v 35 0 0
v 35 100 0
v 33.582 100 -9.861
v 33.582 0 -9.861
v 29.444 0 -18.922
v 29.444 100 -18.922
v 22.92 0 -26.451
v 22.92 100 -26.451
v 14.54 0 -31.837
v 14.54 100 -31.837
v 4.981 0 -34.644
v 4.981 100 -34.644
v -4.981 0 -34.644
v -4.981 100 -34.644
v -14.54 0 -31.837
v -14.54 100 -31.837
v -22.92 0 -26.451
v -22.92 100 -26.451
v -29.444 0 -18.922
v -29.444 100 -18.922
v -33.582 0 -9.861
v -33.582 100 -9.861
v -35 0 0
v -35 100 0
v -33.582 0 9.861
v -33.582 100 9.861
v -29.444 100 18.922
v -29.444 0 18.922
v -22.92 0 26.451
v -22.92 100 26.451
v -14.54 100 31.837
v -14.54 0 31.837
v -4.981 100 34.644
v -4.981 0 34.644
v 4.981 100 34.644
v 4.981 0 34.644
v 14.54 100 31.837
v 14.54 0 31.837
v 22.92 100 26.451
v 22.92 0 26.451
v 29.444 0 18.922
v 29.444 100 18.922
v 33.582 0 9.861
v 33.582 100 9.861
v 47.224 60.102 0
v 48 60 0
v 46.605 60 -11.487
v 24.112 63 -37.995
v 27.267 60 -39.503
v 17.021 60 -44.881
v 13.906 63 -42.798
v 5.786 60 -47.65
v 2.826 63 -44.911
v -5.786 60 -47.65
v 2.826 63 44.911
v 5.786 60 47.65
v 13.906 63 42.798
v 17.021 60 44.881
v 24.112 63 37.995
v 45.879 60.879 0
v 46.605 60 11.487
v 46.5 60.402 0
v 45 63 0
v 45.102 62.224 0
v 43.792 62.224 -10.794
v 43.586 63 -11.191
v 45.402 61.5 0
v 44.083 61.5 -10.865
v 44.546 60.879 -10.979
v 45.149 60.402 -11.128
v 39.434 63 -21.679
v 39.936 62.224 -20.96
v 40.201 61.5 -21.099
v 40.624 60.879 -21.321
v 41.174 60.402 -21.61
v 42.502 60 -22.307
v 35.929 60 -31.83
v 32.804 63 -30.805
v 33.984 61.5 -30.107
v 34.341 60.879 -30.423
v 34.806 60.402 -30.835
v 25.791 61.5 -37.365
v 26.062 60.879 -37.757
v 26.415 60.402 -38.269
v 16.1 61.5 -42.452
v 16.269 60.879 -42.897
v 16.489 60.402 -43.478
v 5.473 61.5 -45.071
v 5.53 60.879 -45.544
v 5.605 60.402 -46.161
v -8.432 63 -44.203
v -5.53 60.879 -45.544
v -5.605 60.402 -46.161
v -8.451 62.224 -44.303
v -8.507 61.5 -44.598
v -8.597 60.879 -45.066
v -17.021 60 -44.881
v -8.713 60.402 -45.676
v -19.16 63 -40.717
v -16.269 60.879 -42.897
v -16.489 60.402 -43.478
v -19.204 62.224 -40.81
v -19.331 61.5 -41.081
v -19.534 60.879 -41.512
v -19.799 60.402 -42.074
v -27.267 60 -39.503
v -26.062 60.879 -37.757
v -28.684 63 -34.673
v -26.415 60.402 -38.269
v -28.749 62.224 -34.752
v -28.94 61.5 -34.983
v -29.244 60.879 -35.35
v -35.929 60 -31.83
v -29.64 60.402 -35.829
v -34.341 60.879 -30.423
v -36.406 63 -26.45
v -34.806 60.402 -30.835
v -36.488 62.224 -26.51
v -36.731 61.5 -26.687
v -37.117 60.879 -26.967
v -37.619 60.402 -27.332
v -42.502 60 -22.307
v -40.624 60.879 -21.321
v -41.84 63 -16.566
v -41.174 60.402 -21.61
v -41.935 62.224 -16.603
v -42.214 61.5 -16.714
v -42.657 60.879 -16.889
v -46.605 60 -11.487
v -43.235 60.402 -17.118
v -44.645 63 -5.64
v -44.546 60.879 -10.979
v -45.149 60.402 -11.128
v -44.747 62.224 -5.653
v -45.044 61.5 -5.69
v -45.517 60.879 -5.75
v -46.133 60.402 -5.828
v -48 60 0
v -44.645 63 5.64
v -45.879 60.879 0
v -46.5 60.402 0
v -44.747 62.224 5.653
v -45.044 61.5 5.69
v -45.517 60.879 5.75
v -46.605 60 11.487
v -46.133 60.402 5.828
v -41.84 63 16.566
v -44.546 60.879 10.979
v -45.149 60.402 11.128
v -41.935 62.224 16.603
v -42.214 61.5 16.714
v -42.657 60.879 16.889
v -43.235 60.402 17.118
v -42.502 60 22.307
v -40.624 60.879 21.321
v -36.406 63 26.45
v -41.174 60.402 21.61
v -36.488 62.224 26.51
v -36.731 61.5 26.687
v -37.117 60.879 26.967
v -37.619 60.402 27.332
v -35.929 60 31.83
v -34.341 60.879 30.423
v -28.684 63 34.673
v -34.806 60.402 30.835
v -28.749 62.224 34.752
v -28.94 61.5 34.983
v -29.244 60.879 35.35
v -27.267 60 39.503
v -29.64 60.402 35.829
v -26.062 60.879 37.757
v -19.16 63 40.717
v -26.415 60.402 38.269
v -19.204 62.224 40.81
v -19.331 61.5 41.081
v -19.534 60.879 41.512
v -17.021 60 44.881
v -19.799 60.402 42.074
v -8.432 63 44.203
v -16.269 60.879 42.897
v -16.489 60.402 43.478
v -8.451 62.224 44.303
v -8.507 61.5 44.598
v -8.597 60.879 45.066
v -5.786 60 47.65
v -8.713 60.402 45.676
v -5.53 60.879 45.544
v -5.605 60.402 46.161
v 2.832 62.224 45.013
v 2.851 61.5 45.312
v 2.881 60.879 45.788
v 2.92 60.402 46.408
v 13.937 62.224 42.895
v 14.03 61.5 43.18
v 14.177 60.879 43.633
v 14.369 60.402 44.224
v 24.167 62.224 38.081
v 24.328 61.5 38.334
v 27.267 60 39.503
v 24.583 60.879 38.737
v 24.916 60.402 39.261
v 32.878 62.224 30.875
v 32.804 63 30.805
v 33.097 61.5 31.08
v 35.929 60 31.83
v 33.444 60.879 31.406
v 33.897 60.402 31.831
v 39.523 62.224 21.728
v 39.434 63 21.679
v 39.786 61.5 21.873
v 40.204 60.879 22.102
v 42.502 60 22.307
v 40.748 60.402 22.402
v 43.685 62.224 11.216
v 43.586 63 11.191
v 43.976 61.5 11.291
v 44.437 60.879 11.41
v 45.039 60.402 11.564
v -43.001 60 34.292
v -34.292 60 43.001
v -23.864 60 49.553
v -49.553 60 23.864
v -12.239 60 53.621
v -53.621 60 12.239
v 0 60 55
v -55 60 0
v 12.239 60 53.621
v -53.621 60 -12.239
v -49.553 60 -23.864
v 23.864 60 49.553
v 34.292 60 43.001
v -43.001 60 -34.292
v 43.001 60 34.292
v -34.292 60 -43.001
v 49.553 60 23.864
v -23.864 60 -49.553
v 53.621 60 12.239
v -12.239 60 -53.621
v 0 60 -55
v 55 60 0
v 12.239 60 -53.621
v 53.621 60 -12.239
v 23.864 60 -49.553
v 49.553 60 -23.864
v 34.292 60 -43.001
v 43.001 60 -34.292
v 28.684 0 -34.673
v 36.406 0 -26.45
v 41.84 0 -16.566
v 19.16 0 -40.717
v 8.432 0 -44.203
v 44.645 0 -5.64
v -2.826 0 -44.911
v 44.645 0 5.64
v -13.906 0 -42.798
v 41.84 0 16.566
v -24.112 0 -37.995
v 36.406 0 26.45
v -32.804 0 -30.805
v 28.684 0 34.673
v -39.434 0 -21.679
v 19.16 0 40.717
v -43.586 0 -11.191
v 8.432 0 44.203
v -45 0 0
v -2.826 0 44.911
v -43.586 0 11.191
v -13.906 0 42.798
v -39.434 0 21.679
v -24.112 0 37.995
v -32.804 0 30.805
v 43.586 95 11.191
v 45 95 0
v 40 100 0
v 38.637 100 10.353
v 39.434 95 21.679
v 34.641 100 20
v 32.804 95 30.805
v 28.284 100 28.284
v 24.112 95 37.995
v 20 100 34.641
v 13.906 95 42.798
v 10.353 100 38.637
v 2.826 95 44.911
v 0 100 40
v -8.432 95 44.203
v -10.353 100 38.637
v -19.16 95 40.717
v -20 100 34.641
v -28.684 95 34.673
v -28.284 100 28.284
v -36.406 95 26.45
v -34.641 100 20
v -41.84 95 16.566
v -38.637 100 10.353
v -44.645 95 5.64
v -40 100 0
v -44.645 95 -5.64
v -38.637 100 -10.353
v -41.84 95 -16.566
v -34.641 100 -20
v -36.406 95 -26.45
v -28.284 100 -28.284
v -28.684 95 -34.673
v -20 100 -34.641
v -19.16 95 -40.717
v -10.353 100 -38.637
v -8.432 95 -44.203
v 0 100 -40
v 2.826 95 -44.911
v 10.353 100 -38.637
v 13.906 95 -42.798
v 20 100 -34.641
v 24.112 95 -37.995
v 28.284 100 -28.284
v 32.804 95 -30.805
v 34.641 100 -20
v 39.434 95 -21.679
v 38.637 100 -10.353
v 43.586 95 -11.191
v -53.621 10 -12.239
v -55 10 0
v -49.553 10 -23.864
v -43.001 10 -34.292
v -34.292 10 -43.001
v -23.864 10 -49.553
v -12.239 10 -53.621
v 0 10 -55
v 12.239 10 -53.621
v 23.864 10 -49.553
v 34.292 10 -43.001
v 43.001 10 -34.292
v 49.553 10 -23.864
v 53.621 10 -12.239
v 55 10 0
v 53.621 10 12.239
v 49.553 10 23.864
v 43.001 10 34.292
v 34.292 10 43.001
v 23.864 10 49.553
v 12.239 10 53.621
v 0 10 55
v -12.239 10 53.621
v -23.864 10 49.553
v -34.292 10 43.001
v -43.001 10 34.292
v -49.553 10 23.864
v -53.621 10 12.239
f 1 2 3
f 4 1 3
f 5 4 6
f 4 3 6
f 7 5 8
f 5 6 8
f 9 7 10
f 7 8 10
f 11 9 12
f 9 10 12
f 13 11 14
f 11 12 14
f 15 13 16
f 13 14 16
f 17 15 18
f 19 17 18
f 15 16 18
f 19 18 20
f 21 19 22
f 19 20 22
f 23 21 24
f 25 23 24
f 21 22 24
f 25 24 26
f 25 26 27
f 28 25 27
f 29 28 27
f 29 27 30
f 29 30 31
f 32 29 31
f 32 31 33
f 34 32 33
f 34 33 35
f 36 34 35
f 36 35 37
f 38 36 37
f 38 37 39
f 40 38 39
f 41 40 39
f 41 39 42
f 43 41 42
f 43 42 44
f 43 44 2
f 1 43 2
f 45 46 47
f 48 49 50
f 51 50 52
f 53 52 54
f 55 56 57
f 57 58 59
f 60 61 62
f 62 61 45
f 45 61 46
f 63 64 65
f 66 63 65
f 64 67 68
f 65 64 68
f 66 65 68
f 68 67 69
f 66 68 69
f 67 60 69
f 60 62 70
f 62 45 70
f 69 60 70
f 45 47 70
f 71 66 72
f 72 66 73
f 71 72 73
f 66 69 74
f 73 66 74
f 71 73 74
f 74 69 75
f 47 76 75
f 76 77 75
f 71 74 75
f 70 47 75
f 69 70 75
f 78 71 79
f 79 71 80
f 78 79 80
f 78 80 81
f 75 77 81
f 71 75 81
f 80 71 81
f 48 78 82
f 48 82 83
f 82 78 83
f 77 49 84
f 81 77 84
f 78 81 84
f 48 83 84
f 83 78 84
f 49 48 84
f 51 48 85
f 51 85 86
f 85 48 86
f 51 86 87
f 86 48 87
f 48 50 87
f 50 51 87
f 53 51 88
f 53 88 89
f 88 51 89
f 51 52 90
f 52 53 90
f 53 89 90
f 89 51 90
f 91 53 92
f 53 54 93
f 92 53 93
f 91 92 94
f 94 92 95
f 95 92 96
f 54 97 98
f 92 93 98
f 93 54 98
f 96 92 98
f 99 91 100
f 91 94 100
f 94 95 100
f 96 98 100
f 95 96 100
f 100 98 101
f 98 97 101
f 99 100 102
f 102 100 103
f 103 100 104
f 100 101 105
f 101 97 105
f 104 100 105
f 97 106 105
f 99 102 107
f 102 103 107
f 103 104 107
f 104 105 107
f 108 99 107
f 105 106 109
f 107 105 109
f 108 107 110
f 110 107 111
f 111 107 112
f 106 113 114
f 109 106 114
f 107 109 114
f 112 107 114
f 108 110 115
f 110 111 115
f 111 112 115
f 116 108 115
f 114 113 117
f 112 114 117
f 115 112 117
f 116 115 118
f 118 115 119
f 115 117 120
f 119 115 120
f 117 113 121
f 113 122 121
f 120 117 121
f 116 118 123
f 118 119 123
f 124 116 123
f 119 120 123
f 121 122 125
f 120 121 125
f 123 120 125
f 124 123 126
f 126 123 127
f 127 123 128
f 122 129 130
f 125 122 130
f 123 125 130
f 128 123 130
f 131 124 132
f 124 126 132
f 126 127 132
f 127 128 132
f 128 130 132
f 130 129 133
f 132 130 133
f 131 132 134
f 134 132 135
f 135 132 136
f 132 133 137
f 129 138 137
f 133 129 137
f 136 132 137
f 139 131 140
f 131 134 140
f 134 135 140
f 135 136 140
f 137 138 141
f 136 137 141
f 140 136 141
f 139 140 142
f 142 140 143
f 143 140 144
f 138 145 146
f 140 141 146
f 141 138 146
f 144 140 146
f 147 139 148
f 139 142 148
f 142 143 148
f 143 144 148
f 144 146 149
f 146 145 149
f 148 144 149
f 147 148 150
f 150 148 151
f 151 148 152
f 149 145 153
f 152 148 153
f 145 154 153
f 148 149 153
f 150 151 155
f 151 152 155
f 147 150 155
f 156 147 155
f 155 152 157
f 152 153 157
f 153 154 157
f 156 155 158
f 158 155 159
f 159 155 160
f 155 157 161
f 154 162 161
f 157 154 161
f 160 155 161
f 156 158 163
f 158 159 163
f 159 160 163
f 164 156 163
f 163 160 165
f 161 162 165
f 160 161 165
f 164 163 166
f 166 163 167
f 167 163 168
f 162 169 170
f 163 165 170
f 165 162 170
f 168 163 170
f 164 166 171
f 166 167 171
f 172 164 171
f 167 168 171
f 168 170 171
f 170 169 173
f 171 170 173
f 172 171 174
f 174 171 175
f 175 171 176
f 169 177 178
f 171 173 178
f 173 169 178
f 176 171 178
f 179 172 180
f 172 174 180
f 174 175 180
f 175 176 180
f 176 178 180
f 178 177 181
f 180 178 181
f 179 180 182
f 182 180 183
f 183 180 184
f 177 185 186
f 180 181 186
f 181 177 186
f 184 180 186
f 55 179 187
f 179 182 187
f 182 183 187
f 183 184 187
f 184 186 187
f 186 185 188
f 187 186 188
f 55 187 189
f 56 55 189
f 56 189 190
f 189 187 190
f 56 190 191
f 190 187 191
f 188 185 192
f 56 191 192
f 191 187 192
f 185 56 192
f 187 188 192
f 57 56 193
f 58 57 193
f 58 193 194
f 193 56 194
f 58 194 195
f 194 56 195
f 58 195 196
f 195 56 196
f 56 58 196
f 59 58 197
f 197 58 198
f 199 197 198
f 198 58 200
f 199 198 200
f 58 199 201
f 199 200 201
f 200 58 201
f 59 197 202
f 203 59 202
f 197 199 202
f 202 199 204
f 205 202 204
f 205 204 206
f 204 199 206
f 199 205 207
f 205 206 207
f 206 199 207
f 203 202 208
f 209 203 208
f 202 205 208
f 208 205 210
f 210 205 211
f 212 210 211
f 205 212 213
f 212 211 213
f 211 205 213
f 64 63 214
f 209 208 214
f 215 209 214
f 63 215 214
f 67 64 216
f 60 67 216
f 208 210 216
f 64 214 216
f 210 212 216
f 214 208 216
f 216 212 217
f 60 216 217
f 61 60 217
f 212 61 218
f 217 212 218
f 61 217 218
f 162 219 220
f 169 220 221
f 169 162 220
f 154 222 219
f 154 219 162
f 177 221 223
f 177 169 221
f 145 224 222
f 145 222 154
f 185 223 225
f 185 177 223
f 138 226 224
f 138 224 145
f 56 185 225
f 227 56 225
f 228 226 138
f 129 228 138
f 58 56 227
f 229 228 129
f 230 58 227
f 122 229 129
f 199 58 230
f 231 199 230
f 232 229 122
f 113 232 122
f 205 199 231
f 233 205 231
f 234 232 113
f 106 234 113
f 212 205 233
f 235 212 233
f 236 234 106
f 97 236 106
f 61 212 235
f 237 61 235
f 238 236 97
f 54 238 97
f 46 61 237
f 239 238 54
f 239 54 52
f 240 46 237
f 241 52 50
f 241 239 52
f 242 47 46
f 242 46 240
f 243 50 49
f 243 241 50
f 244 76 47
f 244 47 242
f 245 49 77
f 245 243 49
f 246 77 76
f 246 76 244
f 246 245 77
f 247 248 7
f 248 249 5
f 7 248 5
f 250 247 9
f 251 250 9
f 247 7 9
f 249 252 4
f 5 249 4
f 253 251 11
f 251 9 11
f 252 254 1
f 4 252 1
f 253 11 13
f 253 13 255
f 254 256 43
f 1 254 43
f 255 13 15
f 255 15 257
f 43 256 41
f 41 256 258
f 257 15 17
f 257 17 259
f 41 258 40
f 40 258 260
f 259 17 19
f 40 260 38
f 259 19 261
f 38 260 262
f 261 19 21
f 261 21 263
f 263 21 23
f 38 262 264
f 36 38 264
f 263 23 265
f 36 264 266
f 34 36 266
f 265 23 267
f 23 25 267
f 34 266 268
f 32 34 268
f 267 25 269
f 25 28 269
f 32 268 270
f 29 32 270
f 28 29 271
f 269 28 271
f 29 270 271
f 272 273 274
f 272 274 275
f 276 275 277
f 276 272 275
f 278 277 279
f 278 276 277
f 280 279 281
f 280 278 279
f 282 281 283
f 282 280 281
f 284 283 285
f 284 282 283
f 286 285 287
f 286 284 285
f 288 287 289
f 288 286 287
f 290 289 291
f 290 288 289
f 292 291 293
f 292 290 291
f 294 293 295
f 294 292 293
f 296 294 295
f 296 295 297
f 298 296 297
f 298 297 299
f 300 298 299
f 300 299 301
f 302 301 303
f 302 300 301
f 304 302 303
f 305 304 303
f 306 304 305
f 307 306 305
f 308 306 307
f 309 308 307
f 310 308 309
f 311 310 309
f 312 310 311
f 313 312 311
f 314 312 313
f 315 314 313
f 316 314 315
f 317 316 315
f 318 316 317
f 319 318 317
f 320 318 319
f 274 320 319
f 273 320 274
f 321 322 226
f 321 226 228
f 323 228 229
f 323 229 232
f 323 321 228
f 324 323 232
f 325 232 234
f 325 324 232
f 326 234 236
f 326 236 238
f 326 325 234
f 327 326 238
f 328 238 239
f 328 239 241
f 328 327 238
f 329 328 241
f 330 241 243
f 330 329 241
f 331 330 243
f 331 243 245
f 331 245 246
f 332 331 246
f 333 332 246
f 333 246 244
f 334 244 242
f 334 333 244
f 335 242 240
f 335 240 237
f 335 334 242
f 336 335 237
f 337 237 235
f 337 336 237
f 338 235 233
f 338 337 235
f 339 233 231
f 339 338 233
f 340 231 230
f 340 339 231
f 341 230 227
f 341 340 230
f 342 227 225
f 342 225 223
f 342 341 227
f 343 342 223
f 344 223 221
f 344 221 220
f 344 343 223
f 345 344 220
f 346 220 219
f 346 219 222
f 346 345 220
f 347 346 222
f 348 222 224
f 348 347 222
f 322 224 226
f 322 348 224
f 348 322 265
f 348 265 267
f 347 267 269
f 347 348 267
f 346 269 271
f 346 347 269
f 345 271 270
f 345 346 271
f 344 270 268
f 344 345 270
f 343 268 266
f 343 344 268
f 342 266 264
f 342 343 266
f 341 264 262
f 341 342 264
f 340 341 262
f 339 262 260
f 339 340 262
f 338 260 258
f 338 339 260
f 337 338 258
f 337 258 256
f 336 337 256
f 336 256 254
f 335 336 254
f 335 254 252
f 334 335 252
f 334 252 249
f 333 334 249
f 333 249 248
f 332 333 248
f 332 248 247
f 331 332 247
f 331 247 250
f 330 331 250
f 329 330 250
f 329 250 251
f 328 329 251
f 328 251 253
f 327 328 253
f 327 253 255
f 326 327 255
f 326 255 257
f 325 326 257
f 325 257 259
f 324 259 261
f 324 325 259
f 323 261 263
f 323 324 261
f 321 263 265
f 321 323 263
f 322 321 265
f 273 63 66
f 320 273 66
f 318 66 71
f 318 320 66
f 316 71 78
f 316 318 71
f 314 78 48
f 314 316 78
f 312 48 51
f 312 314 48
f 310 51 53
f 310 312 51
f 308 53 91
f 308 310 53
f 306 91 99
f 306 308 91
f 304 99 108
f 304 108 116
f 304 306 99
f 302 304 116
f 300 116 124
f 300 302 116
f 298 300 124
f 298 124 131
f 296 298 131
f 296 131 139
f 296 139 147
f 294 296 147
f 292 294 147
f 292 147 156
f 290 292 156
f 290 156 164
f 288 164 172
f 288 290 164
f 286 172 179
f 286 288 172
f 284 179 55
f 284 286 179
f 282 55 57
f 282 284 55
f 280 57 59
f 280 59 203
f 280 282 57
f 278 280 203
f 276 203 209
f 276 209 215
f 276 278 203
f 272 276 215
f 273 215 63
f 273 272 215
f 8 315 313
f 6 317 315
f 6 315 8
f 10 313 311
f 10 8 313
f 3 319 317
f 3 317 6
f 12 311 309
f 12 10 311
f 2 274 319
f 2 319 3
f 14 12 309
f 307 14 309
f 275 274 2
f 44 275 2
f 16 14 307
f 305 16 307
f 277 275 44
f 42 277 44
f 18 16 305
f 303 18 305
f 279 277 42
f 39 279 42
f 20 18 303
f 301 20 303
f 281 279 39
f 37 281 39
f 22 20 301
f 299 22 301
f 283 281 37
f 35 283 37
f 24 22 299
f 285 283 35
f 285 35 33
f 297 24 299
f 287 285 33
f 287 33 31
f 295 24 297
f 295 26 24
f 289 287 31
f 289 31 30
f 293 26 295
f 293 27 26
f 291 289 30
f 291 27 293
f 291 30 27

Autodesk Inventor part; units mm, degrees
ref_plane "YZ Plane" through (0, 0, 0) normal (1, 0, 0) x (0, 1, 0)
ref_plane "XZ Plane" through (0, 0, 0) normal (0, 1, 0) x (-1, 0, 0)
ref_plane "XY Plane" through (0, 0, 0) normal (0, 0, 1) x (1, 0, 0)
sketch "草图1" plane through (0, 0, 0) normal (0, 1, 0) x (-1, 0, 0)
  circle A0 centre (0, 0) radius 55
  dimension "d0" = 110
extrude "拉伸1" add sketch "草图1" along normal blind 100
sketch "草图2" plane through (0, 100, 0) normal (0, 1, 0) x (1, 0, 0)
  circle A0 centre (0, 0) radius 35
  dimension "d3" = 70
extrude "拉伸2" cut sketch "草图2" against normal blind 100
sketch "草图3" plane through (0, 100, 0) normal (0, 1, 0) x (1, 0, 0)
  circle A0 centre (0, 0) radius 45
  circle A1 centre (0, 0) radius 55
  dimension "d6" = 90
  dimension "d7" = 110
extrude "拉伸3" cut sketch "草图3" against normal blind 40
thread "螺纹1" size "M90x6" class "6g" standard "ANSI Metric M Profile" full length
chamfer "倒角1" distance 10 angle 45 1 edges at (55, 0, 0)
chamfer "倒角2" distance 5 angle 45 1 edges at (-45, 100, 0)
fillet "圆角1" radius 3 1 edges at (-45, 60, 0)
properties part number "液压杆盖" material "不锈钢"
